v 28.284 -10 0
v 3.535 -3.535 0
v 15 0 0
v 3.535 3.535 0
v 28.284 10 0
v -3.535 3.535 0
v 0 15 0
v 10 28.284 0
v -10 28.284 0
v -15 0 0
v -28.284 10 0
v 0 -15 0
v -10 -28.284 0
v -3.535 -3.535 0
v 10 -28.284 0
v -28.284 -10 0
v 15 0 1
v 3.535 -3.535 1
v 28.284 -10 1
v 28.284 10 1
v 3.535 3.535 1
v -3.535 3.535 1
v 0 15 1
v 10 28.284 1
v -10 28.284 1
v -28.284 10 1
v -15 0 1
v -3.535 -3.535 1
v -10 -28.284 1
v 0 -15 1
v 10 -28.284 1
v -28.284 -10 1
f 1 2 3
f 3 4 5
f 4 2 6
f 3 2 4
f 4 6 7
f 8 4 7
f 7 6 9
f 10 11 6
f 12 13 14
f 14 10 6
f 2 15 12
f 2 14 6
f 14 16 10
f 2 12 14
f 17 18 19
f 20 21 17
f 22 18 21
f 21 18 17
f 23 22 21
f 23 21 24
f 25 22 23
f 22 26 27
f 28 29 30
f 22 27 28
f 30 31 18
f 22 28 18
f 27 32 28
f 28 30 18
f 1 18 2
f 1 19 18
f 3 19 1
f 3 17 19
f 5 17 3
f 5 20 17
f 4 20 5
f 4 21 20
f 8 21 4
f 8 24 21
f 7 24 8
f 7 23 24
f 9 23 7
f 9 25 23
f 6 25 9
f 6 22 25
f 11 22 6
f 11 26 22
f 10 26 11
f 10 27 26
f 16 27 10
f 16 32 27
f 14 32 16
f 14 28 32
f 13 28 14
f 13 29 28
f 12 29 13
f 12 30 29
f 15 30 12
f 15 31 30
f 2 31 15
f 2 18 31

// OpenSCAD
// Generated by Parametrix
ca_myPartL_face1_000 = [ [ 15.0000, 0.0000 ],[ 28.2843, 10.0000 ],[ 3.5355, 3.5355 ],[ 10.0000, 28.2843 ],[ 0.0000, 15.0000 ],[ -10.0000, 28.2843 ],[ -3.5355, 3.5355 ],[ -28.2843, 10.0000 ],[ -15.0000, 0.0000 ],[ -28.2843, -10.0000 ],[ -3.5355, -3.5355 ],[ -10.0000, -28.2843 ],[ -0.0000, -15.0000 ],[ 10.0000, -28.2843 ],[ 3.5355, -3.5355 ],[ 28.2843, -10.0000 ],[ 15.0000, -0.0000 ] ];
cb_myPartL_face1_000 = [  0, 1, 2, 3, 4, 5, 6, 7, 8, 9, 10, 11, 12, 13, 14, 15, 16 ];
a_myPartL_face1 = concat(ca_myPartL_face1_000);
b_myPartL_face1 = [cb_myPartL_face1_000];

module subpax_myPartL () {
	translate( [ 0, 0, 0 ])
		rotate( [ 0, 0, 0 ])
			   linear_extrude(height = 1) polygon(a_myPartL_face1, b_myPartL_face1);
}

module pax_myPartL () {
	subpax_myPartL();
}

pax_myPartL();
